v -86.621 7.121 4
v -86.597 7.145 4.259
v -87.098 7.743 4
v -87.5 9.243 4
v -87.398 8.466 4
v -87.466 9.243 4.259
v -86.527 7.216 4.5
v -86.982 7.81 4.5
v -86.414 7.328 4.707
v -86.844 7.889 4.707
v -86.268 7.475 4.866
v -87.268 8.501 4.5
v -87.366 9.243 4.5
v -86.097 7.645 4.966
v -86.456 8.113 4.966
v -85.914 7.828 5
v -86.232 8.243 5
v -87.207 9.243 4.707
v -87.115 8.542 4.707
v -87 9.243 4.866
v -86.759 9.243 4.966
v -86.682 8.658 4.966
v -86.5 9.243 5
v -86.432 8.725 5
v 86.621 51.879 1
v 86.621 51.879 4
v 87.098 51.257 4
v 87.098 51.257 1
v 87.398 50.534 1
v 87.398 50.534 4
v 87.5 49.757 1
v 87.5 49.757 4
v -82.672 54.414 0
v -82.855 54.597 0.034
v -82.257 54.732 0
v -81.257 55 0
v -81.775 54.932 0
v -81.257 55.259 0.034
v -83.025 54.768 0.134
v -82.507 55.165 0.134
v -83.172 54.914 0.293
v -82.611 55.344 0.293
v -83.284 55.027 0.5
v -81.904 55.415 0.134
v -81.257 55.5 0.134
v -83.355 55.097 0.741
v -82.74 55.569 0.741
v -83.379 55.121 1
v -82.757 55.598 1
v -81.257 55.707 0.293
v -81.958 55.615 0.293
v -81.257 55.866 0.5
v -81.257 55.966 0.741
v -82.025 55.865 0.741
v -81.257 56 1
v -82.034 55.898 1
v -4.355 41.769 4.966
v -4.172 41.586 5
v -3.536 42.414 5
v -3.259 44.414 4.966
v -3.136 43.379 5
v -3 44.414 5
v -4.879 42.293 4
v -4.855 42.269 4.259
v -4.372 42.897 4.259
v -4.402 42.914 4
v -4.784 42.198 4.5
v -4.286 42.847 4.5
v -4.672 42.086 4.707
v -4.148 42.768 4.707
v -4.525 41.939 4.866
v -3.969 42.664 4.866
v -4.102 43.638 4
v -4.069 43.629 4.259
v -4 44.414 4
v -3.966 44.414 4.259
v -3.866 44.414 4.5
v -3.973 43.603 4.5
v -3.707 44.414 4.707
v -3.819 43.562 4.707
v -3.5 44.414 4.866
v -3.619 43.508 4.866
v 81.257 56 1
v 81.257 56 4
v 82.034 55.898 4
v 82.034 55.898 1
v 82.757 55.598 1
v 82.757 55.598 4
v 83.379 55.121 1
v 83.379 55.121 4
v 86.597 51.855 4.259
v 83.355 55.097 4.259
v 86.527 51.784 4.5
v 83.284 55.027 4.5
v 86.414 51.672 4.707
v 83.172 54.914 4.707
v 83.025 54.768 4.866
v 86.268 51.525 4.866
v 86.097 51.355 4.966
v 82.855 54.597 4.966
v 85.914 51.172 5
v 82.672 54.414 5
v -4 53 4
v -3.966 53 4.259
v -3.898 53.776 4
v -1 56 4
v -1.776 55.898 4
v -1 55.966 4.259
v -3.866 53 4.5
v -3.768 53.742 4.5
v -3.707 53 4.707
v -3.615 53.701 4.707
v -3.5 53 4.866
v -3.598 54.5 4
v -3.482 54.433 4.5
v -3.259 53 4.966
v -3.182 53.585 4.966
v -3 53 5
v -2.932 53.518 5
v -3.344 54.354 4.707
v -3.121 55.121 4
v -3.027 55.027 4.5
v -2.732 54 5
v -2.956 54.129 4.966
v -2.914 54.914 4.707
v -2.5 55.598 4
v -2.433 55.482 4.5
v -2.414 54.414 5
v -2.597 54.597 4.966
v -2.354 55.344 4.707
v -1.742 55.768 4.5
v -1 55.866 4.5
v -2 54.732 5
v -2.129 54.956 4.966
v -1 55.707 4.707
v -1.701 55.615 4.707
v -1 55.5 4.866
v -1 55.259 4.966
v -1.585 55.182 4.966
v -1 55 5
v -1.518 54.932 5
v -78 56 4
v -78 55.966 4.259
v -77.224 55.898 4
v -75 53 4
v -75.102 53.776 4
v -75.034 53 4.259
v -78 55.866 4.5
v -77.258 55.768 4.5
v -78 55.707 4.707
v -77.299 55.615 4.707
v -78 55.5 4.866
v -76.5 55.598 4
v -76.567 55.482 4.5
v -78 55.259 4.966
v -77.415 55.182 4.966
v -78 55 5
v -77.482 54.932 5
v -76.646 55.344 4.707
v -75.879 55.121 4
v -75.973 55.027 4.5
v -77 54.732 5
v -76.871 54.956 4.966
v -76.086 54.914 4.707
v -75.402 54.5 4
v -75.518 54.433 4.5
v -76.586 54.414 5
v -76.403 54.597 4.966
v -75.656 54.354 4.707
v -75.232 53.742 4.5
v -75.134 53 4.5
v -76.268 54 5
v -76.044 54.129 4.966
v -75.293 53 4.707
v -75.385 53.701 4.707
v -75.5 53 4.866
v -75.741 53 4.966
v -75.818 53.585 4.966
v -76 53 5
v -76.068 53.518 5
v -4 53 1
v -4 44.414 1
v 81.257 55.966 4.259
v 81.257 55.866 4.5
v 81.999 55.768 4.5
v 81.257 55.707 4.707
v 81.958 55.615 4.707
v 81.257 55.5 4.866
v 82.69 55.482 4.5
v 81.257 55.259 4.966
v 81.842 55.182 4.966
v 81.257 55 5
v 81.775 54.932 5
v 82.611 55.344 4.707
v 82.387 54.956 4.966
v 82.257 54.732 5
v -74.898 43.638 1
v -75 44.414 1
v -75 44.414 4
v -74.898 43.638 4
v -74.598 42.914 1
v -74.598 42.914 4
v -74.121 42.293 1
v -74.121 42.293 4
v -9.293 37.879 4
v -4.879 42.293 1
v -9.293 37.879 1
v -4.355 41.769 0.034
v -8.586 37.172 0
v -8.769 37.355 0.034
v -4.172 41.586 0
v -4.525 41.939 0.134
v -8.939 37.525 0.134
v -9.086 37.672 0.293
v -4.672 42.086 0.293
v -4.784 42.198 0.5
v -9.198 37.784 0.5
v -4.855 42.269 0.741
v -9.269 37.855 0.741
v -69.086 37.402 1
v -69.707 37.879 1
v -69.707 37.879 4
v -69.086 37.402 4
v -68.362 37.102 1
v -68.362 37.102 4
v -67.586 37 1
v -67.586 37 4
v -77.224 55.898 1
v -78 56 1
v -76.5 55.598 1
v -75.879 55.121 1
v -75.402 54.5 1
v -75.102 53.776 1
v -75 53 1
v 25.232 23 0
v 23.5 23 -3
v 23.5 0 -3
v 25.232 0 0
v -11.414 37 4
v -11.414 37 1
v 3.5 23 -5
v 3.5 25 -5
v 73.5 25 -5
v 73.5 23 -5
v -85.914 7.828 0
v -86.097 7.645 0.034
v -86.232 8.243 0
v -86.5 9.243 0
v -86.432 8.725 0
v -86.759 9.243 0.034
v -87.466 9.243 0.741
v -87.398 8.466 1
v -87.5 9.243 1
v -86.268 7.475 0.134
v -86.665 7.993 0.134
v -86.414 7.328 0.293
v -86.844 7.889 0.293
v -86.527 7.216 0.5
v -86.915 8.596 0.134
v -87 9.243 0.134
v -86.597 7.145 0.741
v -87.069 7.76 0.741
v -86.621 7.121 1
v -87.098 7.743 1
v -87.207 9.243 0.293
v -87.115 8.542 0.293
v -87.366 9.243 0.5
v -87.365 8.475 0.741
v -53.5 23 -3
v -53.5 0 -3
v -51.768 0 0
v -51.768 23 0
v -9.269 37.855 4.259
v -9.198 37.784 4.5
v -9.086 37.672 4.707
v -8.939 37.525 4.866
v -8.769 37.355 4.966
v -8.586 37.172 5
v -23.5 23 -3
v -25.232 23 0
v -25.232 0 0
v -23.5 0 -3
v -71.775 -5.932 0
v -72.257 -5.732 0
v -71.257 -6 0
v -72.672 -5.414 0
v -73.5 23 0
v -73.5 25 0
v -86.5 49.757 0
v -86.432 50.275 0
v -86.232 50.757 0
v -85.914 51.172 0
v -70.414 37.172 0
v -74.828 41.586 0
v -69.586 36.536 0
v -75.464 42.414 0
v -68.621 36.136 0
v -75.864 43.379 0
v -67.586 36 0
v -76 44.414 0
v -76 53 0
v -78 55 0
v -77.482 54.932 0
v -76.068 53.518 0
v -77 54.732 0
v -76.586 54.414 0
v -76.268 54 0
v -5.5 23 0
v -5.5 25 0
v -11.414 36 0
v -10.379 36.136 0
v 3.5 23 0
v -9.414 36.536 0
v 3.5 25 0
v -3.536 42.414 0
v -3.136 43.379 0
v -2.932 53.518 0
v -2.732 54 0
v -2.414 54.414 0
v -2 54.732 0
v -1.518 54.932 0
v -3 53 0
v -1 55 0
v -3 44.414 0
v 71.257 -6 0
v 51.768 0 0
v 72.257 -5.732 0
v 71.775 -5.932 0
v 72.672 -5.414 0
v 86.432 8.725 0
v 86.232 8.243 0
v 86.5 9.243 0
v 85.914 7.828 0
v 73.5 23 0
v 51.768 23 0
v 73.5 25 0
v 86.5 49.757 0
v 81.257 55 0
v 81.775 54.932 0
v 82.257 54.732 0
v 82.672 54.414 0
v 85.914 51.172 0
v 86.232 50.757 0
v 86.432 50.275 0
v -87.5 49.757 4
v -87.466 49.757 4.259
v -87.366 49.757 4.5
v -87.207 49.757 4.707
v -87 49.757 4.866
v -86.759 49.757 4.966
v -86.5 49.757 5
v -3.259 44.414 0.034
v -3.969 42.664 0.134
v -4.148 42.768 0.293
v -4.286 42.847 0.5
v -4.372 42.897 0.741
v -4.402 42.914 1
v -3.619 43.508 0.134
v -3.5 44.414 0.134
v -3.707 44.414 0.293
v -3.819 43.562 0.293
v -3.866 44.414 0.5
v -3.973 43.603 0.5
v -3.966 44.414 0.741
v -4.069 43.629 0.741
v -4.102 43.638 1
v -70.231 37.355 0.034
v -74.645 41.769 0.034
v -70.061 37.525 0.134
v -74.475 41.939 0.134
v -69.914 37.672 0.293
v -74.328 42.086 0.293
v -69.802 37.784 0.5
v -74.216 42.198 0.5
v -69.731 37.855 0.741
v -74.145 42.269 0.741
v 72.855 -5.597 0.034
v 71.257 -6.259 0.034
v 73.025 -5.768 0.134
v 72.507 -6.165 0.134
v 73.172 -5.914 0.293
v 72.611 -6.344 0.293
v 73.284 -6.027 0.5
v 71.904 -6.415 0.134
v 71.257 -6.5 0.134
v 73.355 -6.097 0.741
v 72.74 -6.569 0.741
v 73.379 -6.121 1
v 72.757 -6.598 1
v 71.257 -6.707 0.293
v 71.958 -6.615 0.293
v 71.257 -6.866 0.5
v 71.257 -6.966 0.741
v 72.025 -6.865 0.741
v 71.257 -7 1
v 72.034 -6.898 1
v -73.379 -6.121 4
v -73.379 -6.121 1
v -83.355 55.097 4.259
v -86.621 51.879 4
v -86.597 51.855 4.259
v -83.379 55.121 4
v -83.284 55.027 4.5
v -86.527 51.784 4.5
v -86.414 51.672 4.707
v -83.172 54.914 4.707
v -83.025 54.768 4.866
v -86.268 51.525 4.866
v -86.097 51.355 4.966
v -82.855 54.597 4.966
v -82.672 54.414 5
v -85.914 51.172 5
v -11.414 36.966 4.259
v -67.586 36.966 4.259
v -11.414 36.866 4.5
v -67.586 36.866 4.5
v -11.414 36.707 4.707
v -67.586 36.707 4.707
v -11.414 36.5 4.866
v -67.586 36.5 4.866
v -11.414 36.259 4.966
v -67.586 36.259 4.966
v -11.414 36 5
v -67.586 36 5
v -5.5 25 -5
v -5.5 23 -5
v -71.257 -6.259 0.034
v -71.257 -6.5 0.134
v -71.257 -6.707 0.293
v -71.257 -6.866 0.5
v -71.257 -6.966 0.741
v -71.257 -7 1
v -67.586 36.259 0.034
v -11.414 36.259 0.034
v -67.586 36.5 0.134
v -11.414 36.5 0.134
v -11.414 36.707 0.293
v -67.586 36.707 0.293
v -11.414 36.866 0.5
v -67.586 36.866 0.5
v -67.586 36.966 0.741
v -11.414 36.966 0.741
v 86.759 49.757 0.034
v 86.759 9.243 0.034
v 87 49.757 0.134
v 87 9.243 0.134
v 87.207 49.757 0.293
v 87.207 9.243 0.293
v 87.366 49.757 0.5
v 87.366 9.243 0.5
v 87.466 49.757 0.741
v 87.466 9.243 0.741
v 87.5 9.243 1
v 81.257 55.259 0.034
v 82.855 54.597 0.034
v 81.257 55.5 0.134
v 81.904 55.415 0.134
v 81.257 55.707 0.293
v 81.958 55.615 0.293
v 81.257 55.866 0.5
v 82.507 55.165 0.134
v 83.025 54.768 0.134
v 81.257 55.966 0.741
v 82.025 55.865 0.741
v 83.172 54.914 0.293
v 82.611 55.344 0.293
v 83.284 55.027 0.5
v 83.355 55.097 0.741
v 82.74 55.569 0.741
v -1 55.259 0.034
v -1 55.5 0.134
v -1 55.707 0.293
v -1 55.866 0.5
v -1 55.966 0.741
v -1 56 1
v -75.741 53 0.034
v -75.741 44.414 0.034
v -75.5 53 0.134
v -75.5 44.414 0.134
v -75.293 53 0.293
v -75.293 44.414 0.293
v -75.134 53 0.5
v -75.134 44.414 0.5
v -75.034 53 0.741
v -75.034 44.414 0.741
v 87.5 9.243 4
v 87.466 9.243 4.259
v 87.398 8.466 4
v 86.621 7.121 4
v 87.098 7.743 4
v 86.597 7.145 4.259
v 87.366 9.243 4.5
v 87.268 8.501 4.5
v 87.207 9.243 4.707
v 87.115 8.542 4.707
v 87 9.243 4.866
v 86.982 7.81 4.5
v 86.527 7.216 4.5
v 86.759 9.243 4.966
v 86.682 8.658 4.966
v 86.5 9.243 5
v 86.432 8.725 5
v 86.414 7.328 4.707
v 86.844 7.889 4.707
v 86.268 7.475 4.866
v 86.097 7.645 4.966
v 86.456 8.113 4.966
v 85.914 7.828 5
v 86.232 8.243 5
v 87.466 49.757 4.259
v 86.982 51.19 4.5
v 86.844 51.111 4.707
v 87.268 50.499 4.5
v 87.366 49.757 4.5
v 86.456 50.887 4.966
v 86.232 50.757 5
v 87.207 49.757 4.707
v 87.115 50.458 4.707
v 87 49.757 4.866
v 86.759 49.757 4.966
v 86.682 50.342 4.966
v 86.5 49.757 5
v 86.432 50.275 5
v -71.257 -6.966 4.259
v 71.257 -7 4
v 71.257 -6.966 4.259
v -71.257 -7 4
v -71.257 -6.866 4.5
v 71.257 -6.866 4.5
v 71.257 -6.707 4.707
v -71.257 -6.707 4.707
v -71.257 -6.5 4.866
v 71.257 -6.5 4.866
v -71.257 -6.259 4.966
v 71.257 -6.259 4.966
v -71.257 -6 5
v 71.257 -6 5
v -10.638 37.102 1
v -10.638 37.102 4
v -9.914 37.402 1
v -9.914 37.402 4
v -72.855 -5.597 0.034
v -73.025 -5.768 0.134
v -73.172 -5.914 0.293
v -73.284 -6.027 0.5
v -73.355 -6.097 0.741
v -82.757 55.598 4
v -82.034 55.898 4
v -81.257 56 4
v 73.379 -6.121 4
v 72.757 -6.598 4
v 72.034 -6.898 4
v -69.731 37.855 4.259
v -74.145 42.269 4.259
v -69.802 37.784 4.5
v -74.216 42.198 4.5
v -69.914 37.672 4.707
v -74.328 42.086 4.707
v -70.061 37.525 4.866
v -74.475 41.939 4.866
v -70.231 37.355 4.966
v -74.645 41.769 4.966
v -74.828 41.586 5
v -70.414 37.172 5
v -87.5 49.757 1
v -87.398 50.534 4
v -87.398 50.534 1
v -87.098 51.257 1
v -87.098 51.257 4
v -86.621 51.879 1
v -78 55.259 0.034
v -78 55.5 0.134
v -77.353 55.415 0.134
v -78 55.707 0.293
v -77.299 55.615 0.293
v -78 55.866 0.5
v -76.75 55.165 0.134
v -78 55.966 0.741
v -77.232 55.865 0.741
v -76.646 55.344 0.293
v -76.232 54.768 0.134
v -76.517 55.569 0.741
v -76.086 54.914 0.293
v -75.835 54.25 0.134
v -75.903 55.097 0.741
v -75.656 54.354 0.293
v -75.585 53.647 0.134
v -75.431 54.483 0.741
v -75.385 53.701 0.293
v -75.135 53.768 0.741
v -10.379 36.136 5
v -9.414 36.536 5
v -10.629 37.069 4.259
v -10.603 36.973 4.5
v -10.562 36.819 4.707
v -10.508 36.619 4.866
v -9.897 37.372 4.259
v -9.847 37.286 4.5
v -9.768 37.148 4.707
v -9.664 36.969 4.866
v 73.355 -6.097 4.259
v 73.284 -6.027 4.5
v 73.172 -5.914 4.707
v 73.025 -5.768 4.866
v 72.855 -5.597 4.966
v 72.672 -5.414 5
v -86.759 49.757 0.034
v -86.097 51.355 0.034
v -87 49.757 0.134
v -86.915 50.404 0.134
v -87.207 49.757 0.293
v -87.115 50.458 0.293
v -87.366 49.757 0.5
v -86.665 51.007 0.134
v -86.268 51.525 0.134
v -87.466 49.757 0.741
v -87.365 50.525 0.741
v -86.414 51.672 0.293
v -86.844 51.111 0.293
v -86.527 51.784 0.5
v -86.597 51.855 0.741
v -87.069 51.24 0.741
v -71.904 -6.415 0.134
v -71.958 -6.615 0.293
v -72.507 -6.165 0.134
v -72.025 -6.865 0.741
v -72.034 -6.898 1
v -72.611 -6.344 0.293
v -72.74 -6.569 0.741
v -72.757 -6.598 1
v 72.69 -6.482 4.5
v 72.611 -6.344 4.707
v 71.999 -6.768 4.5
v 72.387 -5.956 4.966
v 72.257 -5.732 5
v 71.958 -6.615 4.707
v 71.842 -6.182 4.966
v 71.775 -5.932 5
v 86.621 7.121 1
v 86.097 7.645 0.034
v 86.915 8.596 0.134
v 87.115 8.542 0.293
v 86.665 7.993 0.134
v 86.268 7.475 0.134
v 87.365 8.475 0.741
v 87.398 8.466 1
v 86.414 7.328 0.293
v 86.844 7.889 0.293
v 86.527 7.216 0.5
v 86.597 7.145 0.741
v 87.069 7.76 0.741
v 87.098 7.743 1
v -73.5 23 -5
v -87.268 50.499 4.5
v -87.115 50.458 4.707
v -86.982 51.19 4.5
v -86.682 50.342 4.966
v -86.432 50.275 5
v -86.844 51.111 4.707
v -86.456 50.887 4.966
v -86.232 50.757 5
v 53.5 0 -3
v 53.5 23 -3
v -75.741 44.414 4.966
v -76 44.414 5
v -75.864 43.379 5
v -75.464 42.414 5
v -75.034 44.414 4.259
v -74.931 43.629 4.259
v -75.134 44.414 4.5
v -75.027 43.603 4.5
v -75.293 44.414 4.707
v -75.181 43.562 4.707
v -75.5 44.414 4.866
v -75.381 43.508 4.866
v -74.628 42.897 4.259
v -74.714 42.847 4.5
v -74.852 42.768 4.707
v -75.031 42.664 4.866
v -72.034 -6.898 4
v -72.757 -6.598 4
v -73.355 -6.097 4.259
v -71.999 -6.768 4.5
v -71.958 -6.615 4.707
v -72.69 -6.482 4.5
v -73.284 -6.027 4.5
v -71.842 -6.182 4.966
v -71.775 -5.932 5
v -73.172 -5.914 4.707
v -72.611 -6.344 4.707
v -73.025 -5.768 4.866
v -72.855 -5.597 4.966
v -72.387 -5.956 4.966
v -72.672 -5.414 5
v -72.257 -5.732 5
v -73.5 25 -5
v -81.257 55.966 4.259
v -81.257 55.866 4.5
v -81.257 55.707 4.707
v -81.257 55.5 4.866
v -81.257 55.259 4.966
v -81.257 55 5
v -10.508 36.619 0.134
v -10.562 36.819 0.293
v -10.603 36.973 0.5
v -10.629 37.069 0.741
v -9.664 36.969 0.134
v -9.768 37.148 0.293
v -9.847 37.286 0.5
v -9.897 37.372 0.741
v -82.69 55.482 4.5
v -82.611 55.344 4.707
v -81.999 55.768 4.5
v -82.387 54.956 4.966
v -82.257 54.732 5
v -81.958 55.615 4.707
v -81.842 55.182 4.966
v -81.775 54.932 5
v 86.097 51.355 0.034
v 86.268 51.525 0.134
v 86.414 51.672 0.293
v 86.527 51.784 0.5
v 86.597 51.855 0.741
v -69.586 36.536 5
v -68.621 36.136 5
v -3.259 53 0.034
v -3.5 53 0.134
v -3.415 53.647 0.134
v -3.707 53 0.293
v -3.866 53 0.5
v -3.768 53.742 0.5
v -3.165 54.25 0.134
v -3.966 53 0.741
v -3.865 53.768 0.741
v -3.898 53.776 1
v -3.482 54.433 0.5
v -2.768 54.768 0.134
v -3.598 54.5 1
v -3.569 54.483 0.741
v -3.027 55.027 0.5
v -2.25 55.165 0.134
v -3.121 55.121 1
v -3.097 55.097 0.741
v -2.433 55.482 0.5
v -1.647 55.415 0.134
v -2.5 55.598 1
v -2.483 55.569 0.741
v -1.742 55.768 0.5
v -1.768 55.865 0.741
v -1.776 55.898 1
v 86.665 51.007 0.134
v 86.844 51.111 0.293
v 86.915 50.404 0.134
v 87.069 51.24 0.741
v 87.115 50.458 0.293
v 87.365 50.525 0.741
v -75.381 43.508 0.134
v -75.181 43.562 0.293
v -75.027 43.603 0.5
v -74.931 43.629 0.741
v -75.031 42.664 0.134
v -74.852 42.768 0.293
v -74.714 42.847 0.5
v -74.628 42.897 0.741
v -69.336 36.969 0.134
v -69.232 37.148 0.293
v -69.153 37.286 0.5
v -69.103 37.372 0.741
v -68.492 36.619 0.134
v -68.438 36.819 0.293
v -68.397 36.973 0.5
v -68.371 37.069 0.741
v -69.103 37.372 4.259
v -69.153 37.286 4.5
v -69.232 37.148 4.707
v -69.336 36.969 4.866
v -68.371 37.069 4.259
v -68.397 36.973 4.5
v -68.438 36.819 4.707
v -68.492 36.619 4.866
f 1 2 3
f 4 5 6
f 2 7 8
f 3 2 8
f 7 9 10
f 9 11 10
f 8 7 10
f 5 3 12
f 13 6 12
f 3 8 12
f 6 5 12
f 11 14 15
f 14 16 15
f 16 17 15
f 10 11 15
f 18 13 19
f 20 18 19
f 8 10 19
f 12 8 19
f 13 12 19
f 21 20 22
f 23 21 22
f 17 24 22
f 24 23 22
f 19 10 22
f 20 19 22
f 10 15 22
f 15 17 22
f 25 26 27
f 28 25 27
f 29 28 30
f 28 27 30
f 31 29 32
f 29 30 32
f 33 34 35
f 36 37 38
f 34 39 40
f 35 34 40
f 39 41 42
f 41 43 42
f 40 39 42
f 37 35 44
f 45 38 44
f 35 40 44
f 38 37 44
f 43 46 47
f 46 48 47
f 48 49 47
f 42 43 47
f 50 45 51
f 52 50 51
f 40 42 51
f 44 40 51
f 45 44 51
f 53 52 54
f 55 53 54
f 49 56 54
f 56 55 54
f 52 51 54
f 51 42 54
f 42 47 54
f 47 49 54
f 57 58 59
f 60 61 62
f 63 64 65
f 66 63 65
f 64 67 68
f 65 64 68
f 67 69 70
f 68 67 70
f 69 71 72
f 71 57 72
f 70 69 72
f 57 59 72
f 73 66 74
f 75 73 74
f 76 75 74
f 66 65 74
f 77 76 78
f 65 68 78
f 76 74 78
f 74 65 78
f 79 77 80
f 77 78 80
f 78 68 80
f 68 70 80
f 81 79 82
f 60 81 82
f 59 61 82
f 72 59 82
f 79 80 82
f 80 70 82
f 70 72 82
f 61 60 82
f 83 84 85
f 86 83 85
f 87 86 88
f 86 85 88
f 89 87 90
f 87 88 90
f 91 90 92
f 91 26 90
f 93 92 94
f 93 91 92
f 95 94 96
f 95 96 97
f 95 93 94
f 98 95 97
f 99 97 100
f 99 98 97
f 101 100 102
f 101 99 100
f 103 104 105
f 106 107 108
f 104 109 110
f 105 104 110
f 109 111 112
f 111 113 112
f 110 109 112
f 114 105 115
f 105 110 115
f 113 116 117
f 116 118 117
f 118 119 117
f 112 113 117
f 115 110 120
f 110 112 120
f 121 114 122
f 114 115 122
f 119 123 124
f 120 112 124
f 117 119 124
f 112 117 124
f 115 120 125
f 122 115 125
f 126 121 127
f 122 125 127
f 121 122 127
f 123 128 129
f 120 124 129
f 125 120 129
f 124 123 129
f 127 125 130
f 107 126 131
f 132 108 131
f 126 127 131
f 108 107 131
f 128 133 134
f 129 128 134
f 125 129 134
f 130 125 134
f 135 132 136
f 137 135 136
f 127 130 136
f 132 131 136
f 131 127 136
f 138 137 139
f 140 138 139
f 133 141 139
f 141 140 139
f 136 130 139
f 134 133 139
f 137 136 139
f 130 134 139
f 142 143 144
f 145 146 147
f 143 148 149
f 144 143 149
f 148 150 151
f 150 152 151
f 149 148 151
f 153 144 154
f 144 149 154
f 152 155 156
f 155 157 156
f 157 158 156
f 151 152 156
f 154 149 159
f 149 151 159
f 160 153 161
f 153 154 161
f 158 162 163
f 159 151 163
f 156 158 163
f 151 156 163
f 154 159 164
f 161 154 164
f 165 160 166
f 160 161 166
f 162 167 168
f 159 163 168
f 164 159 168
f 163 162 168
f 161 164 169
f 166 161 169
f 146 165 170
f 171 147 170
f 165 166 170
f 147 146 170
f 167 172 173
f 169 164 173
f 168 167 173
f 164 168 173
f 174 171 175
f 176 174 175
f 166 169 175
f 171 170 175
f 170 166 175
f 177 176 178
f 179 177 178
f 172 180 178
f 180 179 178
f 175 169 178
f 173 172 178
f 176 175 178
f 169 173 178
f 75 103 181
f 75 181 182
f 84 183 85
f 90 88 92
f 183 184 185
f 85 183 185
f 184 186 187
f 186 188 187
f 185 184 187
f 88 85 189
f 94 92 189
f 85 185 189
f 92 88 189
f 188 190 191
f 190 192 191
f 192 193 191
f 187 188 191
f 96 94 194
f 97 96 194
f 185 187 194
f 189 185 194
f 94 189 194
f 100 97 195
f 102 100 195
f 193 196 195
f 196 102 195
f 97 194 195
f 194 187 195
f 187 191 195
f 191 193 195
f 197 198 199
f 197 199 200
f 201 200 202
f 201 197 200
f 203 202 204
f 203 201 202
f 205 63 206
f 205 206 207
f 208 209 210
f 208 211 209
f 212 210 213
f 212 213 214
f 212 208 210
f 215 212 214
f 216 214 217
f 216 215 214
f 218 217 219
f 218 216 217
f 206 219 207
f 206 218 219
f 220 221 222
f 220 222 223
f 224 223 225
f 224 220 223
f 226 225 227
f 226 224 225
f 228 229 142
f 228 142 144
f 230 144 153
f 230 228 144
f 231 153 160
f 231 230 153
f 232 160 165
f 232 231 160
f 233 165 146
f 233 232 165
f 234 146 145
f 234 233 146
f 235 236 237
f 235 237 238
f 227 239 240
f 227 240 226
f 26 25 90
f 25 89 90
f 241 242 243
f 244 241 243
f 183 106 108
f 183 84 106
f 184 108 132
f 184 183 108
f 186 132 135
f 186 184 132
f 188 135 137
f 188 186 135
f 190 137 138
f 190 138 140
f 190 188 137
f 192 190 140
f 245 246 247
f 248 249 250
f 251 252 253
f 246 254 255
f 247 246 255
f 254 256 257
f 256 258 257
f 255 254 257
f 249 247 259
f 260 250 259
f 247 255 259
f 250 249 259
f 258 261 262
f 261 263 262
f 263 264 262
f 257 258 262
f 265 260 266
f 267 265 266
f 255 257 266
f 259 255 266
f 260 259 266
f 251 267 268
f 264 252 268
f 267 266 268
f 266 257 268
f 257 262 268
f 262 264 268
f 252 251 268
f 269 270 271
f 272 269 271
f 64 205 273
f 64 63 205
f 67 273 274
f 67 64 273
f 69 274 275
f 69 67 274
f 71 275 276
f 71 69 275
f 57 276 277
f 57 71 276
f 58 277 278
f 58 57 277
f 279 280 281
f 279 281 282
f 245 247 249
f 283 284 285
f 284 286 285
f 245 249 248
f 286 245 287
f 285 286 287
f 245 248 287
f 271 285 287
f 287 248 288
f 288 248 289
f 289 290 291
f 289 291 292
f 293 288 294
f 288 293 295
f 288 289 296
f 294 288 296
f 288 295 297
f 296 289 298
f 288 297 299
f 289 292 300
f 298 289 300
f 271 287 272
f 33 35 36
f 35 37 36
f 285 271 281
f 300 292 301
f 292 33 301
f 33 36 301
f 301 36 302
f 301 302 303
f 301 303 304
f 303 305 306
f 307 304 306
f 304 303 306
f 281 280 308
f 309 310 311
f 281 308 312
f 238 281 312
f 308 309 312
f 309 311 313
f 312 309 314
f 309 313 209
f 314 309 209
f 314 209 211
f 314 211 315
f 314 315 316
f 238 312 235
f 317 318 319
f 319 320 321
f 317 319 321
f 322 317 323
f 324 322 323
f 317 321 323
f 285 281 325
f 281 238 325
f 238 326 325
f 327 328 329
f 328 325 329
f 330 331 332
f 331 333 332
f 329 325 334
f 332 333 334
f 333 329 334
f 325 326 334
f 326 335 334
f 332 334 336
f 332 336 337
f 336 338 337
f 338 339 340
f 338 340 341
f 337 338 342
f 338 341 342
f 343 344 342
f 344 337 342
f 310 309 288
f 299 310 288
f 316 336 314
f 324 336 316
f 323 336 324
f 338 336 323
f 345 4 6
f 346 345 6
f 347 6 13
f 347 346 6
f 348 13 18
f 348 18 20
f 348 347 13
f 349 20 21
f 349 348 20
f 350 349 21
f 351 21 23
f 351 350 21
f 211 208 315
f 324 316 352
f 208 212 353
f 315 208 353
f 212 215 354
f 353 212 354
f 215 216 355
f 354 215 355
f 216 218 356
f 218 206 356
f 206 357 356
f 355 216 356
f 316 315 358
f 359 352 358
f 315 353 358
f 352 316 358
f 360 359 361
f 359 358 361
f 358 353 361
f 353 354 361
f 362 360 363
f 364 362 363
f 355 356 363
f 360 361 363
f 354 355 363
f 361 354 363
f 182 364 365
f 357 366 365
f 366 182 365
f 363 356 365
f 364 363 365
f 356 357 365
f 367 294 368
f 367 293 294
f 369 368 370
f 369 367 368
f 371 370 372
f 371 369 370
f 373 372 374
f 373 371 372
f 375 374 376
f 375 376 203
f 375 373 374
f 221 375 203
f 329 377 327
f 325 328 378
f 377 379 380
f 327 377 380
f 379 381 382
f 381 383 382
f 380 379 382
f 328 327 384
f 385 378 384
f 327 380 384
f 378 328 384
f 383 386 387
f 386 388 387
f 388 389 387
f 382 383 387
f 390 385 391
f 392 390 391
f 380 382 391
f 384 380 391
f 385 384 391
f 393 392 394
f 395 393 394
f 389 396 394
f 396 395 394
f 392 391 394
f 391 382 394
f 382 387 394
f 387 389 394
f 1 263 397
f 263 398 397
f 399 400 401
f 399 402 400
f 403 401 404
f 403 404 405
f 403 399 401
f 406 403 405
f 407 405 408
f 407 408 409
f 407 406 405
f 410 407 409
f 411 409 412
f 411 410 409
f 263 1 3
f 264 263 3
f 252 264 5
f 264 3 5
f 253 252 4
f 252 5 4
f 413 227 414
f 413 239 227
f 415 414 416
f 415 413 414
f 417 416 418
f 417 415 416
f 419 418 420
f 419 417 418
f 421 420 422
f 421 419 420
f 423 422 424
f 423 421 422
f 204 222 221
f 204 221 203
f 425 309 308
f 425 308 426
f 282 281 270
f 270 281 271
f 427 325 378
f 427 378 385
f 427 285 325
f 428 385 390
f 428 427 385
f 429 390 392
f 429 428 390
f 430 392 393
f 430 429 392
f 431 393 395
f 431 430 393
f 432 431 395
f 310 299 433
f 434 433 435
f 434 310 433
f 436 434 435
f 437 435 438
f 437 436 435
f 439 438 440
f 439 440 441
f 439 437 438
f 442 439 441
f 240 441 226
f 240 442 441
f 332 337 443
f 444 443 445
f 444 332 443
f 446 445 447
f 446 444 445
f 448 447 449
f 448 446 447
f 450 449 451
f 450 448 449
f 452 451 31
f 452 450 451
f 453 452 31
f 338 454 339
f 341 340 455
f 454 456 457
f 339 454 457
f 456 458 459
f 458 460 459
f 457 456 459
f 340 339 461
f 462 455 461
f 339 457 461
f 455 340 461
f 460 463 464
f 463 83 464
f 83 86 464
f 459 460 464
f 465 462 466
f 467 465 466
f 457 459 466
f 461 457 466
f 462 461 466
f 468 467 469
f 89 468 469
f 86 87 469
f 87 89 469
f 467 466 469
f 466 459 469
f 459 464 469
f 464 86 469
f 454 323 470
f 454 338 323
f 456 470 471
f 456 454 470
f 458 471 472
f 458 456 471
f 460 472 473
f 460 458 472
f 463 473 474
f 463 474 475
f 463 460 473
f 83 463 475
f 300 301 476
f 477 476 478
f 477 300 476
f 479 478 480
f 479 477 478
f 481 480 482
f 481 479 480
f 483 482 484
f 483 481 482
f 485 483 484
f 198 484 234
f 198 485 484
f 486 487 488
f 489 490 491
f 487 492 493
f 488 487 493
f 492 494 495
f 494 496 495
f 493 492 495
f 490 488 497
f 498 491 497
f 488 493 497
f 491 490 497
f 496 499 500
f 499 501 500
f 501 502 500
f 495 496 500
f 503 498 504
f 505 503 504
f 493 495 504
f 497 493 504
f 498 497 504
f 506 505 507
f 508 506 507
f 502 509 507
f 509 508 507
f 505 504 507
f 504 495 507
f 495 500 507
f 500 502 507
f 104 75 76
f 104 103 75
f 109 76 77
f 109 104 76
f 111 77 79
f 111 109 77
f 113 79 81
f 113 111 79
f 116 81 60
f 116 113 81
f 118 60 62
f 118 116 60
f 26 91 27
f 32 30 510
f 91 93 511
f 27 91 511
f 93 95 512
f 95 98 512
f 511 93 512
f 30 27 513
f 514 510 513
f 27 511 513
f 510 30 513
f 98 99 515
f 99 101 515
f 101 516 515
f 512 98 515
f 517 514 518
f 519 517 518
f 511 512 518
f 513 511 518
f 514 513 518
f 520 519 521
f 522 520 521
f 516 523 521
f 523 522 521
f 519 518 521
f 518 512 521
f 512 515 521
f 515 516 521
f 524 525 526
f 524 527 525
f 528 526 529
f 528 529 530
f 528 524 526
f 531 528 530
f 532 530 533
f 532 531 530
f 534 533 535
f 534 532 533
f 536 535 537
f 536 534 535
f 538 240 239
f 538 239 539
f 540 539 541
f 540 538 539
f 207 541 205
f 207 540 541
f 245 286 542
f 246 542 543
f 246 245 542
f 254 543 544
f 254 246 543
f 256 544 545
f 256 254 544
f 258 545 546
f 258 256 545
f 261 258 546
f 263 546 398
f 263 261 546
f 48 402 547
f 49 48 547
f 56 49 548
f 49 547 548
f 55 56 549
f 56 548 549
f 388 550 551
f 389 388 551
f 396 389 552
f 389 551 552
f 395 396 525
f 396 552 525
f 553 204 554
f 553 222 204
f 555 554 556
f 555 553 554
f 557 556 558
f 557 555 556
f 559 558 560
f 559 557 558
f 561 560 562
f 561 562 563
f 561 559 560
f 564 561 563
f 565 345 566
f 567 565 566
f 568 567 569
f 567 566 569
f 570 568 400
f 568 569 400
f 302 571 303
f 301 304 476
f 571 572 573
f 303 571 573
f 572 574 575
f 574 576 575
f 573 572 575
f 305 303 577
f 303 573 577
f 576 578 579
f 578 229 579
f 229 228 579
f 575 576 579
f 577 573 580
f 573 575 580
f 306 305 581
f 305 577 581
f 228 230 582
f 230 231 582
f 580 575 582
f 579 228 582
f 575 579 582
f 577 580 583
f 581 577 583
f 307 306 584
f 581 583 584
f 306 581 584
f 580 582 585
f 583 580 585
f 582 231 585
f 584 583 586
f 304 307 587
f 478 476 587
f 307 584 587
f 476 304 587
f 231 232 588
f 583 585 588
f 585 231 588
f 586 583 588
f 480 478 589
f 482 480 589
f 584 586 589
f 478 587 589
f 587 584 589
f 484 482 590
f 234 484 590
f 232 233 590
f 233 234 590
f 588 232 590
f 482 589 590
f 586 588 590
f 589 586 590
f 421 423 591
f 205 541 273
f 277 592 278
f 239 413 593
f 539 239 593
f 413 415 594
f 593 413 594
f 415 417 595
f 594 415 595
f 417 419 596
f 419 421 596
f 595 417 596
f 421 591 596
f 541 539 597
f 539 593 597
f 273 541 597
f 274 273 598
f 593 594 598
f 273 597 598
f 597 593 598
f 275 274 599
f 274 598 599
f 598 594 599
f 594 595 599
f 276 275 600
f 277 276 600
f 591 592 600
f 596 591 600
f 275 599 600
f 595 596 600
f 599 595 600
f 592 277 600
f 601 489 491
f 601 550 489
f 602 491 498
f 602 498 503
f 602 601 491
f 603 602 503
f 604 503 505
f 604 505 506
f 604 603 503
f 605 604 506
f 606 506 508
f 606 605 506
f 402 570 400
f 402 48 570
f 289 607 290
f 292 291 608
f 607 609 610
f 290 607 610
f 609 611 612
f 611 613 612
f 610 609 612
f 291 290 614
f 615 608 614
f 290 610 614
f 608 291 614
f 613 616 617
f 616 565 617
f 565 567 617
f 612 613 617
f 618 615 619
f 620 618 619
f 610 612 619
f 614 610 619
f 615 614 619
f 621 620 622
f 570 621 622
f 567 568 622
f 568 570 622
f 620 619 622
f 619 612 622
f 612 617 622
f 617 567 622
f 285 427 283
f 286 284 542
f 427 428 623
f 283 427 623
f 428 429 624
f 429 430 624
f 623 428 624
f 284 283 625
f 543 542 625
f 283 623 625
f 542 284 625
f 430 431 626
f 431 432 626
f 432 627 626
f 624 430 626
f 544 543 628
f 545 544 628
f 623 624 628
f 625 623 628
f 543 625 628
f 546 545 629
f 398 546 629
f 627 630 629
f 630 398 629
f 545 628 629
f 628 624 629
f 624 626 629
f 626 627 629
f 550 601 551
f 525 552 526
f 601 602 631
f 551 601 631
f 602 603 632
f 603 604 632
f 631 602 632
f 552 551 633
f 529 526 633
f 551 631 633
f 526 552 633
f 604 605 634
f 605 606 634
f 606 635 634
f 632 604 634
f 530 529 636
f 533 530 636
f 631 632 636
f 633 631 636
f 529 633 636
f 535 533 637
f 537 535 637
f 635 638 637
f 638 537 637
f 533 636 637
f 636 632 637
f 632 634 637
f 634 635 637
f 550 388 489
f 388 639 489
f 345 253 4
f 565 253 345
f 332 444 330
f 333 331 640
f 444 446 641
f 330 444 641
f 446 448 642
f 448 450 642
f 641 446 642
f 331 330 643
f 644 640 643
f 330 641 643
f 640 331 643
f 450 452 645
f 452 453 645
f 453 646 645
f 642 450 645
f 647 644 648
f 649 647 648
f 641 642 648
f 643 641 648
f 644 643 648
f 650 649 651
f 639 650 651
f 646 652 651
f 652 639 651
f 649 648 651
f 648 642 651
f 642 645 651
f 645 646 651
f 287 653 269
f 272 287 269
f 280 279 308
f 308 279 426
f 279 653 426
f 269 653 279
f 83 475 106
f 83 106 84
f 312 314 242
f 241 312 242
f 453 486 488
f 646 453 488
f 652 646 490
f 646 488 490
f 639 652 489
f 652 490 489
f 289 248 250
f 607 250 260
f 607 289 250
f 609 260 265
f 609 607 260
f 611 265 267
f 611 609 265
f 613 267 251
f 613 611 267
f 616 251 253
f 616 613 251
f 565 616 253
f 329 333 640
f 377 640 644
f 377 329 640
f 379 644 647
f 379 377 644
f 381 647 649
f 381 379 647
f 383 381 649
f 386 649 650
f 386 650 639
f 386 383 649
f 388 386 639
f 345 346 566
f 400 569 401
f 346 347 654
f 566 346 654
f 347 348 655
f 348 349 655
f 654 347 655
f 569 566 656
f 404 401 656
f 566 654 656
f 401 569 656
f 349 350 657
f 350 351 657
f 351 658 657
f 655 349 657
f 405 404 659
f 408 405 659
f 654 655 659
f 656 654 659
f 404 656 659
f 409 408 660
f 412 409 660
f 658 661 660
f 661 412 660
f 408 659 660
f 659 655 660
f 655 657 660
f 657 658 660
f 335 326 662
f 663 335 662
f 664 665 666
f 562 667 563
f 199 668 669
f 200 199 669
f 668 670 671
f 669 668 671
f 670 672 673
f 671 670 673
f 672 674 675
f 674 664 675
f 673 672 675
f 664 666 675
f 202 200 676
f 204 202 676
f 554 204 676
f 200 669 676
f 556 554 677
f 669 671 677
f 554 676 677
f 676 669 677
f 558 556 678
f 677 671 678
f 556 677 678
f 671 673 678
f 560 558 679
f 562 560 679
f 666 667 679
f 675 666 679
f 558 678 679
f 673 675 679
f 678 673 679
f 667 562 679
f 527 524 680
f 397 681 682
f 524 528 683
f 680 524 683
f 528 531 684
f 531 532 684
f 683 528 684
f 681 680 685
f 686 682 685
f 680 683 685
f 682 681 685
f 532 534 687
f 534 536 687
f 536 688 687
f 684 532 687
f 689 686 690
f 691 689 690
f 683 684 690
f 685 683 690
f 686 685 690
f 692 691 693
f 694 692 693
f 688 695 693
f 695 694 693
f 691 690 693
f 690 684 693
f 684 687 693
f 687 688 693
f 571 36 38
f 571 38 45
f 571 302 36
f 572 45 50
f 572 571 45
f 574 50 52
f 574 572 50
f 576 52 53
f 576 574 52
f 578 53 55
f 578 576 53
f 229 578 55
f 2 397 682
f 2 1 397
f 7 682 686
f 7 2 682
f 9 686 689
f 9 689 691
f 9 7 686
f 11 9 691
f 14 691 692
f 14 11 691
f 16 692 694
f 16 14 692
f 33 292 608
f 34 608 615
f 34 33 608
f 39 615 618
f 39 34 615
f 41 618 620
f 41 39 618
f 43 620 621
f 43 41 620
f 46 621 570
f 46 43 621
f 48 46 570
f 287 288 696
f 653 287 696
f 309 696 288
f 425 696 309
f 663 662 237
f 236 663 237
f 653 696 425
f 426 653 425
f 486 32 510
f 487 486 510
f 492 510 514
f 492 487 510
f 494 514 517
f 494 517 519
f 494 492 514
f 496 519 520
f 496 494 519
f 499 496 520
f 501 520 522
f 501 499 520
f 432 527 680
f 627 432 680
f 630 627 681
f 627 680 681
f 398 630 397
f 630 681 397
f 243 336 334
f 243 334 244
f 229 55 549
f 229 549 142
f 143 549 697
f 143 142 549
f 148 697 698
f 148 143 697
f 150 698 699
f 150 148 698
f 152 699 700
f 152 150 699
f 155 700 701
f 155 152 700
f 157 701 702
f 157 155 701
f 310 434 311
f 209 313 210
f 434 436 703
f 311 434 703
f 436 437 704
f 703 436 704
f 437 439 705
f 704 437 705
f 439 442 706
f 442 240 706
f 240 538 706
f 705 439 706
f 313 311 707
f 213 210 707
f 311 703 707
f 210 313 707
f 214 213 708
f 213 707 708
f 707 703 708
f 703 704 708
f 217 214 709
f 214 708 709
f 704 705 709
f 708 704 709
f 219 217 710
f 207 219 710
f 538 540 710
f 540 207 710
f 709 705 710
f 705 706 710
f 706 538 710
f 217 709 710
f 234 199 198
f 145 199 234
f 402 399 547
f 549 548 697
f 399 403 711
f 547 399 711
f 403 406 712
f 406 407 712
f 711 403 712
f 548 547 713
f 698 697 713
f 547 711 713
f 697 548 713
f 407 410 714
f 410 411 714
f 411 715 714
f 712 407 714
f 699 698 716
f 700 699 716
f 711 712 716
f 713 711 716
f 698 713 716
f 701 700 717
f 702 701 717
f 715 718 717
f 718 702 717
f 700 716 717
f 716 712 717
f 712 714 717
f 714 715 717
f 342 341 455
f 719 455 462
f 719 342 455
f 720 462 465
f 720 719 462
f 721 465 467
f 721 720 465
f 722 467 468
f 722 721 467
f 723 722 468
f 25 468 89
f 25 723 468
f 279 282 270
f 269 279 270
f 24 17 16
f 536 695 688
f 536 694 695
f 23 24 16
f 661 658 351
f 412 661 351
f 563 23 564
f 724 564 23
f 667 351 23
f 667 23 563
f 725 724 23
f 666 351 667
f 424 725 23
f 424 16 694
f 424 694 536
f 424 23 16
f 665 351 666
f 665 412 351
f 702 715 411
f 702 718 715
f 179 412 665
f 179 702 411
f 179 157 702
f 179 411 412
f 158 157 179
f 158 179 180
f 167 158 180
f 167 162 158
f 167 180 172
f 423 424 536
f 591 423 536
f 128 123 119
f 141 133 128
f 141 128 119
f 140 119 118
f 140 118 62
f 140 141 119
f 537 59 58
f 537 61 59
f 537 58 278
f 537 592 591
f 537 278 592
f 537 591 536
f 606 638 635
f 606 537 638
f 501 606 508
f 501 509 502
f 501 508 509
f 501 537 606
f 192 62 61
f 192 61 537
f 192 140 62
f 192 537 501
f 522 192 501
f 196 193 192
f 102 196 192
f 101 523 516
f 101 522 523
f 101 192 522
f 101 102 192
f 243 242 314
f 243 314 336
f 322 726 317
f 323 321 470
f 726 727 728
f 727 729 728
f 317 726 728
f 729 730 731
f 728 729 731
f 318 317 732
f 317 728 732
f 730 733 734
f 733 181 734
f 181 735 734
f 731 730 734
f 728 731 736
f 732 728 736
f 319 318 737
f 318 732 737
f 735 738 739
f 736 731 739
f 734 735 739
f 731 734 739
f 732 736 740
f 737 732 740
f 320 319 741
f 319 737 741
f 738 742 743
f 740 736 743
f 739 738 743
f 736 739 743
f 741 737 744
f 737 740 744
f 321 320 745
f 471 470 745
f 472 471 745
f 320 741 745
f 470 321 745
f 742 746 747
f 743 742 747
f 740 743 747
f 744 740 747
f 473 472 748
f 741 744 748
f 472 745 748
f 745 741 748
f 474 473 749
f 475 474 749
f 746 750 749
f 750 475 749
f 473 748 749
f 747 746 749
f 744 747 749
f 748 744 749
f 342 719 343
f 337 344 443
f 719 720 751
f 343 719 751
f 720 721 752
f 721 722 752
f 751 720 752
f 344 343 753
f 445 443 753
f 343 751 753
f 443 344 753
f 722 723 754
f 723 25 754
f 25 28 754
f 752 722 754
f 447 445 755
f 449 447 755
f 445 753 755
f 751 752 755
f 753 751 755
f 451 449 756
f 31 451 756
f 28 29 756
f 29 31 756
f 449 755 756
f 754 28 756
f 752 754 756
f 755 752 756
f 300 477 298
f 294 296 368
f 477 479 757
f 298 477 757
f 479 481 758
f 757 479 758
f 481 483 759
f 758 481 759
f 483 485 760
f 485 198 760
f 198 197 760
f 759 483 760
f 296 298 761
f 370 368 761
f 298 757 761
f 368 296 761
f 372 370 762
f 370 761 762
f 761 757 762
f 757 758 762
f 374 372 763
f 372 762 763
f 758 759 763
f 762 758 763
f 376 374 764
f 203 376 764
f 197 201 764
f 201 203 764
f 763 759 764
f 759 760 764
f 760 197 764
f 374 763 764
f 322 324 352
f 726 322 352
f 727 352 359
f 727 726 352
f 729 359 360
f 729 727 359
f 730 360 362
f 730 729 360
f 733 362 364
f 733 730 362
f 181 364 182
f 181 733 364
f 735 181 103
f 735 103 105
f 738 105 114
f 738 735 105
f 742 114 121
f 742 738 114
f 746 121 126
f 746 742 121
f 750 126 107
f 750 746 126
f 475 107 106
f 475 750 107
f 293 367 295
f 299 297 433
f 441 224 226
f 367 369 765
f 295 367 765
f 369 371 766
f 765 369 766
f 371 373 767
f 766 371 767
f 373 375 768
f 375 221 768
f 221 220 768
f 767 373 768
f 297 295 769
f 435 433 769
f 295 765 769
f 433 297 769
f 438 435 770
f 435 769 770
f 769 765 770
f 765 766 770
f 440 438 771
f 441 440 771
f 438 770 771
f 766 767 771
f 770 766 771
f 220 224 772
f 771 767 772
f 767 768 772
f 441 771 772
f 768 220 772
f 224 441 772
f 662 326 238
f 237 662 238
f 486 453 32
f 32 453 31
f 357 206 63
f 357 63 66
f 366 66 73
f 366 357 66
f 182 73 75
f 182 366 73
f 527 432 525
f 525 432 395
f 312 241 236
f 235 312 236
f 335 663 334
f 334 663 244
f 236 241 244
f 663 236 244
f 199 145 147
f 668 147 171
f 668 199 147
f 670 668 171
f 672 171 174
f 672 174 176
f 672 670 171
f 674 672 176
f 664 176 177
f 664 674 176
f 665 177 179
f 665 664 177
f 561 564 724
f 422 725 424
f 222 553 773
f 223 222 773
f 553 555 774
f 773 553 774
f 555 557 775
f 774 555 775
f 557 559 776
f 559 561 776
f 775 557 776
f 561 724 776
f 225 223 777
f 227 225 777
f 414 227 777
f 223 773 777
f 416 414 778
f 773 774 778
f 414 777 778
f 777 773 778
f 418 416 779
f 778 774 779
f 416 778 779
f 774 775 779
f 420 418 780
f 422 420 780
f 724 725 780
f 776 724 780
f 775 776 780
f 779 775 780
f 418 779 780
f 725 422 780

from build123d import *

# Parameters (mm, degrees)
SKETCH_1_W          = 175
SKETCH_1_H          = 63
EXTRUDE_1_DEPTH     = 5
CUT_EXTRUDE_1_DEPTH = 5
CHAMFER_1_SIZE      = 15
CHAMFER_2_SIZE      = 5
EXTRUDE_START       = -7
EXTRUDE_2_DEPTH     = 25
EXTRUDE_START_2     = -12
SKETCH_5_W          = 68
SKETCH_5_H          = 5
SKETCH_5_W_2        = 70
EXTRUDE_4_DEPTH     = 2
FILLET_1_R          = 3
FILLET_2_R          = 3
FILLET_3_R          = 1


with BuildPart() as part:
    # 草图1 → 凸台-拉伸1 (new body)
    with BuildSketch(Plane.XY):
        with Locations((0, 24.5)):
            Rectangle(SKETCH_1_W, SKETCH_1_H)
    extrude(amount=EXTRUDE_1_DEPTH)

    # 草图2 → 切除-拉伸1 (cut)
    with BuildSketch(Plane.XY.offset(5)):
        Polygon((-75, 56), (-4, 56), (-4, 43.171572875), (-10.171572875, 37), (-68.828427125, 37), (-75, 43.171572875), align=None)
    extrude(amount=-CUT_EXTRUDE_1_DEPTH, mode=Mode.SUBTRACT)

    # 倒角1
    chamfer_1_edges = [part.edges().sort_by_distance(p)[0] for p in [
        (87.5, -7, 2.5),
        (-87.5, -7, 2.5),
    ]]
    chamfer(chamfer_1_edges, length=CHAMFER_1_SIZE)

    # 倒角2
    chamfer_2_edges = [part.edges().sort_by_distance(p)[0] for p in [
        (-87.5, 56, 2.5),
        (87.5, 56, 2.5),
    ]]
    chamfer(chamfer_2_edges, length=CHAMFER_2_SIZE)

    # 草图4 → 凸台-拉伸2 (add)
    with BuildSketch(Plane.XZ.offset(7).offset(EXTRUDE_START)):
        Polygon((-23.5, -3), (-53.5, -3), (-51.767949192, 0), (-25.232050808, 0), align=None)
        Polygon((23.5, -3), (25.232050808, 0), (51.767949192, 0), (53.5, -3), align=None)
    extrude(amount=-EXTRUDE_2_DEPTH)

    # 草图5 → 凸台-拉伸4 (add)
    with BuildSketch(Plane(origin=(0, 37, 0), x_dir=(1, 0, 0), z_dir=(0, 1, 0)).offset(EXTRUDE_START_2)):
        with Locations((-39.5, 2.5)):
            Rectangle(SKETCH_5_W, SKETCH_5_H)
        with Locations((38.5, 2.5)):
            Rectangle(SKETCH_5_W_2, SKETCH_5_H)
    extrude(amount=-EXTRUDE_4_DEPTH)

    # 圆角1
    fillet_1_edges = [part.edges().sort_by_distance(p)[0] for p in [
        (-4, 43.171572875, 2.5),
        (-10.171572875, 37, 2.5),
        (-68.828427125, 37, 2.5),
        (-75, 43.171572875, 2.5),
        (-75, 56, 2.5),
        (-4, 56, 2.5),
        (72.5, -7, 2.5),
        (-72.5, -7, 2.5),
        (-87.5, 8, 2.5),
        (87.5, 8, 2.5),
        (82.5, 56, 2.5),
        (87.5, 51, 2.5),
        (-82.5, 56, 2.5),
    ]]
    fillet(fillet_1_edges, radius=FILLET_1_R)

    # 圆角2
    fillet_2_edges = [part.edges().sort_by_distance(p)[0] for p in [
        (-87.5, 51, 2.5),
    ]]
    fillet(fillet_2_edges, radius=FILLET_2_R)

    # 圆角3
    fillet_3_edges = [part.edges().sort_by_distance(p)[0] for p in [
        (40.128679656, 56, 5),
        (40.128679656, 56, 0),
        (87.5, 29.5, 5),
        (85, 53.5, 5),
        (-4, 48.707106781, 5),
        (-7.085786438, 40.085786438, 5),
        (-39.5, 37, 5),
        (-71.914213562, 40.085786438, 5),
        (-75, 48.707106781, 5),
        (-79.628679656, 56, 5),
        (-85, 53.5, 5),
        (-80, 0.5, 5),
        (0, -7, 5),
        (80, 0.5, 5),
        (-82.40540961, 55.771638598, 5),
        (-87.271638598, 8.09459039, 5),
        (-72.40540961, -6.771638598, 5),
        (82.40540961, 55.771638598, 5),
        (87.271638598, 50.90540961, 5),
        (87.271638598, 8.09459039, 5),
        (72.40540961, -6.771638598, 5),
        (-75.878679656, 55.121320344, 5),
        (-3.121320344, 55.121320344, 5),
        (-4, 48.707106781, 0),
        (85, 53.5, 0),
        (87.5, 29.5, 0),
        (80, 0.5, 0),
        (0, -7, 0),
        (-80, 0.5, 0),
        (-79.628679656, 56, 0),
        (-75, 48.707106781, 0),
        (-71.914213562, 40.085786438, 0),
        (-39.5, 37, 0),
        (-7.085786438, 40.085786438, 0),
        (-82.40540961, 55.771638598, 0),
        (-87.271638598, 8.09459039, 0),
        (-72.40540961, -6.771638598, 0),
        (82.40540961, 55.771638598, 0),
        (87.271638598, 50.90540961, 0),
        (87.271638598, 8.09459039, 0),
        (72.40540961, -6.771638598, 0),
        (-75.878679656, 55.121320344, 0),
        (-3.121320344, 55.121320344, 0),
        (-4.228361402, 43.266163265, 5),
        (-4.228361402, 43.266163265, 0),
        (-10.266163265, 37.228361402, 5),
        (-10.266163265, 37.228361402, 0),
        (-68.733836735, 37.228361402, 5),
        (-68.733836735, 37.228361402, 0),
        (-74.771638598, 43.266163265, 5),
        (-74.771638598, 43.266163265, 0),
        (-87.5, 29.5, 0),
        (-87.5, 29.5, 5),
        (-85, 53.5, 0),
        (-87.271638598, 50.90540961, 0),
        (-87.271638598, 50.90540961, 5),
    ]]
    fillet(fillet_3_edges, radius=FILLET_3_R)


solid = part.part
